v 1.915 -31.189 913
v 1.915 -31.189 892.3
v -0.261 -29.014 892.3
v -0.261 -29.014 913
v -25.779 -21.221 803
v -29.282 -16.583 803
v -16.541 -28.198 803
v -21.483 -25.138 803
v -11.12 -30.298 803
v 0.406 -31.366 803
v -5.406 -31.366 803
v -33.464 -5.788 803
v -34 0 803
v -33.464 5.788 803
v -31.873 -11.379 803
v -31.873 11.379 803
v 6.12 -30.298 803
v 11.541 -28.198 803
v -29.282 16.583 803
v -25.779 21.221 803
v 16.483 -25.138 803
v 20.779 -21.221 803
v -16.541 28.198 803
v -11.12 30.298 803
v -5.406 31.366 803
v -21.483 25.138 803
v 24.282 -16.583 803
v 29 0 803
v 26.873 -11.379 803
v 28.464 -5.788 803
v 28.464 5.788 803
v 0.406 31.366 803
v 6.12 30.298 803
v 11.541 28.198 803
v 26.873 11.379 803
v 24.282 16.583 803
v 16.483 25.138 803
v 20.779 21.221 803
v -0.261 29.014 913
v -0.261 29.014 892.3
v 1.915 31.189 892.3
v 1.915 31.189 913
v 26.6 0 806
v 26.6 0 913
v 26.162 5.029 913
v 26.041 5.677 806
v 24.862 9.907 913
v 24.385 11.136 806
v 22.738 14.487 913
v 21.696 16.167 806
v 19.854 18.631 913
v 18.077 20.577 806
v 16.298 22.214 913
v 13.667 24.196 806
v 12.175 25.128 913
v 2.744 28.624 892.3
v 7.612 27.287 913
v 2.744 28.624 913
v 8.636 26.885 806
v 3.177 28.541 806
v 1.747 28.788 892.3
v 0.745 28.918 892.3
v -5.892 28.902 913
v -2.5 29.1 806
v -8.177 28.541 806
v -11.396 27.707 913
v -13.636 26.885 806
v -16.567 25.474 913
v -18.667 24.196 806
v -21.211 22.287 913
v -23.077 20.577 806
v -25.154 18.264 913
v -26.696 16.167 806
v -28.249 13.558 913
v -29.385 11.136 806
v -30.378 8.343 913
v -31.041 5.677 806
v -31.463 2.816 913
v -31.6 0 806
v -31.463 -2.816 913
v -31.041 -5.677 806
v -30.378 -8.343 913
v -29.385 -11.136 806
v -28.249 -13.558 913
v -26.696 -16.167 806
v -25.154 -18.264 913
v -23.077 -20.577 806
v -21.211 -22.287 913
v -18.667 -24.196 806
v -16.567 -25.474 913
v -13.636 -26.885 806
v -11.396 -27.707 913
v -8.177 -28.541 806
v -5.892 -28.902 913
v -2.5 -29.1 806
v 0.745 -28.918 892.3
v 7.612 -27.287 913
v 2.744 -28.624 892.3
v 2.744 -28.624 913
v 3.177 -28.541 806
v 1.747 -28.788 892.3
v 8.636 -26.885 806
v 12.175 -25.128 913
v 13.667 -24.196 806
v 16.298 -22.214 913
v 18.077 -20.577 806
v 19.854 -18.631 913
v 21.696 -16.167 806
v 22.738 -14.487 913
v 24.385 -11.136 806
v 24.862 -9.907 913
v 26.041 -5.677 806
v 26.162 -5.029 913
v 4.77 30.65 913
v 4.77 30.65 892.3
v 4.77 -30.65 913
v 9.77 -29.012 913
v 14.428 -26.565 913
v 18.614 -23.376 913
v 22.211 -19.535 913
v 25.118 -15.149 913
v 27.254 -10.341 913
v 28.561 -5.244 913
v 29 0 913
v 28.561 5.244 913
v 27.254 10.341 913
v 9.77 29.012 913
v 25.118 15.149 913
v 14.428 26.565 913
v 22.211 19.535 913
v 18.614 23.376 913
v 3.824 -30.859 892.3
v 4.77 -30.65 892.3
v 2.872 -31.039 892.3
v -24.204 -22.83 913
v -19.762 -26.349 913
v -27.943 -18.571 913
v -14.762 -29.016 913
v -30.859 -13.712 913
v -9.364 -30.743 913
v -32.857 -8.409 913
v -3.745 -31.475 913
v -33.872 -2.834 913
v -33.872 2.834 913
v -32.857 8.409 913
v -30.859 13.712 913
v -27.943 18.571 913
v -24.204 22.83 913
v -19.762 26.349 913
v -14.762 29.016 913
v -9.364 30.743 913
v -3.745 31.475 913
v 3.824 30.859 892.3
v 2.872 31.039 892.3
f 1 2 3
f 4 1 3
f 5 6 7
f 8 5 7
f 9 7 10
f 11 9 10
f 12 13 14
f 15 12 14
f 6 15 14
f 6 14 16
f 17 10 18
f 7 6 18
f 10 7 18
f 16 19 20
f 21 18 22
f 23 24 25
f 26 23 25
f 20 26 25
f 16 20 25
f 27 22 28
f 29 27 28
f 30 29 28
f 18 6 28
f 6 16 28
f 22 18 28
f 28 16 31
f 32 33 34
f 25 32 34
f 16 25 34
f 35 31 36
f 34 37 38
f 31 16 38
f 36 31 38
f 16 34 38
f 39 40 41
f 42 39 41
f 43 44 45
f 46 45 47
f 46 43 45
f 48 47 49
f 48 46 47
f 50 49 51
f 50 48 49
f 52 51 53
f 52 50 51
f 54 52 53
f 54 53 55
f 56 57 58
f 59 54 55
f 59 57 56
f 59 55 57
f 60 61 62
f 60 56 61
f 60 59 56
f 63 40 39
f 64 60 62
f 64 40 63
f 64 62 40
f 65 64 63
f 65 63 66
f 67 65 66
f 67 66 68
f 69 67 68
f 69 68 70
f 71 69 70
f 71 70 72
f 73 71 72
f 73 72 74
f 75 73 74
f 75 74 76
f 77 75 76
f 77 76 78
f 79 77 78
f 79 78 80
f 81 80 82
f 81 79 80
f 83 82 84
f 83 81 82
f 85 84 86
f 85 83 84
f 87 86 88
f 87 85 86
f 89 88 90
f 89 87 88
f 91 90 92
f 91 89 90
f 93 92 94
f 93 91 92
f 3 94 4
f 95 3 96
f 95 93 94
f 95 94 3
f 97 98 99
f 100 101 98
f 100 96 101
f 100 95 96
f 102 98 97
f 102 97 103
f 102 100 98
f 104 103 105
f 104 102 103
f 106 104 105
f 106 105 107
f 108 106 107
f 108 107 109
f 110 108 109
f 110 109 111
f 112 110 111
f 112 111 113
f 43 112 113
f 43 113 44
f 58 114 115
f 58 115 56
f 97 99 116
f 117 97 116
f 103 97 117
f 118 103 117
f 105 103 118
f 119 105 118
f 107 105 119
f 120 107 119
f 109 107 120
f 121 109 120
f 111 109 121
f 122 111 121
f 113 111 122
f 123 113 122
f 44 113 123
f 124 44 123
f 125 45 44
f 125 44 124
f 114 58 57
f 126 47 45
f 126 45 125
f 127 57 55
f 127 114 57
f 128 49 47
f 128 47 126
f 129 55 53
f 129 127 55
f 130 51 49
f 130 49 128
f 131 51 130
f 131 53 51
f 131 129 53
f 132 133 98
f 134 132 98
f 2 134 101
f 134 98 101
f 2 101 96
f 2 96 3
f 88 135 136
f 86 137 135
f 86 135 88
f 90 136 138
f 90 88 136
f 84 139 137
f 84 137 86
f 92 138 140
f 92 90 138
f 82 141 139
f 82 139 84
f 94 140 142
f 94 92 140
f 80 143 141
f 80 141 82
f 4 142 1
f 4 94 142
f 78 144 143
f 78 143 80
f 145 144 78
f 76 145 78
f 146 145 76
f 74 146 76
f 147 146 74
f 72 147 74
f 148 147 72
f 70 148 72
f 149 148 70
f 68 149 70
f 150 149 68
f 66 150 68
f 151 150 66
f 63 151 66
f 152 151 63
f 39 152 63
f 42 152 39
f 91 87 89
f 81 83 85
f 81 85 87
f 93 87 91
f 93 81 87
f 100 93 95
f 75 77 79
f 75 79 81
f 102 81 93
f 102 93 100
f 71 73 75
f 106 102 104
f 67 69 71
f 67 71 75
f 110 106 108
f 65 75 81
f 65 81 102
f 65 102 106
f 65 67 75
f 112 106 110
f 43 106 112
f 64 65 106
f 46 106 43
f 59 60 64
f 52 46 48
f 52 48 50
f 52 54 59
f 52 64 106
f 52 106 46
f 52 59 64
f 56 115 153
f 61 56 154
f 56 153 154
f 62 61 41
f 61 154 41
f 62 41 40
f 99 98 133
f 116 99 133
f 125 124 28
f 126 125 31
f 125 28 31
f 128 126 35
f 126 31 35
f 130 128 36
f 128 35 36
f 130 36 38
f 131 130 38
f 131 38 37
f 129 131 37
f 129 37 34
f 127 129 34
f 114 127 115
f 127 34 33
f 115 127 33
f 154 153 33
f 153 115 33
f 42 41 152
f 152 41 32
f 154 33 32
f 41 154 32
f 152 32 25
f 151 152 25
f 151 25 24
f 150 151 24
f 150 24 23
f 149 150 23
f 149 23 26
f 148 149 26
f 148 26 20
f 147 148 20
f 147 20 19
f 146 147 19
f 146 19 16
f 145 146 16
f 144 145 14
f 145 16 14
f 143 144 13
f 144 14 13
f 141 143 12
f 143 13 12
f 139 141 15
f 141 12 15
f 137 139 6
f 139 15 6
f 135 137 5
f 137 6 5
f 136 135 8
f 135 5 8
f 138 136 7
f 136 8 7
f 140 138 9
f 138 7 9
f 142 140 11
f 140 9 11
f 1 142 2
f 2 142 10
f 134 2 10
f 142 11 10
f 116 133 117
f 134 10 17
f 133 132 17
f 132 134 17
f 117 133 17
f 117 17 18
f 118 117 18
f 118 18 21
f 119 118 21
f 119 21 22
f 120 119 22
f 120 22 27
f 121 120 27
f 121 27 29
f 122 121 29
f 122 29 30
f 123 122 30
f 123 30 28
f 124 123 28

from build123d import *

# Parameters (mm, degrees)
CYLINDER007_R     = 31.5
CYLINDER007_DEPTH = 110
CYLINDER008_R     = 29.1
CYLINDER008_DEPTH = 110
POCKET064_DEPTH   = 20.7


with BuildPart() as part:
    # Cylinder007 → Cylinder007 (join)
    with BuildSketch(Plane.XY.offset(-31)):
        Circle(CYLINDER007_R)
    extrude(amount=CYLINDER007_DEPTH)

    # Cylinder008 → Cylinder008 (cut)
    with BuildSketch(Plane.XY.offset(-28)):
        Circle(CYLINDER008_R)
    extrude(amount=CYLINDER008_DEPTH, mode=Mode.SUBTRACT)

    # Sketch123 (on DatumPlane) → Pocket064 (cut)
    with BuildSketch(Plane.XY.offset(79)):
        Polygon((-20.565207, -6.209014), (-18.868151, -4.511957), (9.318102, -32.69821), (7.621046, -34.395267), align=None)
        Polygon((-18.868151, 4.511957), (-20.565207, 6.209014), (7.621046, 34.395267), (9.318102, 32.69821), align=None)
    extrude(amount=-POCKET064_DEPTH, mode=Mode.SUBTRACT)


with BuildPart() as part_1:
    # Body022024 placement: moved
    add(part.part.moved(Location((-2.5, 0, 834))))


solid = part_1.part
